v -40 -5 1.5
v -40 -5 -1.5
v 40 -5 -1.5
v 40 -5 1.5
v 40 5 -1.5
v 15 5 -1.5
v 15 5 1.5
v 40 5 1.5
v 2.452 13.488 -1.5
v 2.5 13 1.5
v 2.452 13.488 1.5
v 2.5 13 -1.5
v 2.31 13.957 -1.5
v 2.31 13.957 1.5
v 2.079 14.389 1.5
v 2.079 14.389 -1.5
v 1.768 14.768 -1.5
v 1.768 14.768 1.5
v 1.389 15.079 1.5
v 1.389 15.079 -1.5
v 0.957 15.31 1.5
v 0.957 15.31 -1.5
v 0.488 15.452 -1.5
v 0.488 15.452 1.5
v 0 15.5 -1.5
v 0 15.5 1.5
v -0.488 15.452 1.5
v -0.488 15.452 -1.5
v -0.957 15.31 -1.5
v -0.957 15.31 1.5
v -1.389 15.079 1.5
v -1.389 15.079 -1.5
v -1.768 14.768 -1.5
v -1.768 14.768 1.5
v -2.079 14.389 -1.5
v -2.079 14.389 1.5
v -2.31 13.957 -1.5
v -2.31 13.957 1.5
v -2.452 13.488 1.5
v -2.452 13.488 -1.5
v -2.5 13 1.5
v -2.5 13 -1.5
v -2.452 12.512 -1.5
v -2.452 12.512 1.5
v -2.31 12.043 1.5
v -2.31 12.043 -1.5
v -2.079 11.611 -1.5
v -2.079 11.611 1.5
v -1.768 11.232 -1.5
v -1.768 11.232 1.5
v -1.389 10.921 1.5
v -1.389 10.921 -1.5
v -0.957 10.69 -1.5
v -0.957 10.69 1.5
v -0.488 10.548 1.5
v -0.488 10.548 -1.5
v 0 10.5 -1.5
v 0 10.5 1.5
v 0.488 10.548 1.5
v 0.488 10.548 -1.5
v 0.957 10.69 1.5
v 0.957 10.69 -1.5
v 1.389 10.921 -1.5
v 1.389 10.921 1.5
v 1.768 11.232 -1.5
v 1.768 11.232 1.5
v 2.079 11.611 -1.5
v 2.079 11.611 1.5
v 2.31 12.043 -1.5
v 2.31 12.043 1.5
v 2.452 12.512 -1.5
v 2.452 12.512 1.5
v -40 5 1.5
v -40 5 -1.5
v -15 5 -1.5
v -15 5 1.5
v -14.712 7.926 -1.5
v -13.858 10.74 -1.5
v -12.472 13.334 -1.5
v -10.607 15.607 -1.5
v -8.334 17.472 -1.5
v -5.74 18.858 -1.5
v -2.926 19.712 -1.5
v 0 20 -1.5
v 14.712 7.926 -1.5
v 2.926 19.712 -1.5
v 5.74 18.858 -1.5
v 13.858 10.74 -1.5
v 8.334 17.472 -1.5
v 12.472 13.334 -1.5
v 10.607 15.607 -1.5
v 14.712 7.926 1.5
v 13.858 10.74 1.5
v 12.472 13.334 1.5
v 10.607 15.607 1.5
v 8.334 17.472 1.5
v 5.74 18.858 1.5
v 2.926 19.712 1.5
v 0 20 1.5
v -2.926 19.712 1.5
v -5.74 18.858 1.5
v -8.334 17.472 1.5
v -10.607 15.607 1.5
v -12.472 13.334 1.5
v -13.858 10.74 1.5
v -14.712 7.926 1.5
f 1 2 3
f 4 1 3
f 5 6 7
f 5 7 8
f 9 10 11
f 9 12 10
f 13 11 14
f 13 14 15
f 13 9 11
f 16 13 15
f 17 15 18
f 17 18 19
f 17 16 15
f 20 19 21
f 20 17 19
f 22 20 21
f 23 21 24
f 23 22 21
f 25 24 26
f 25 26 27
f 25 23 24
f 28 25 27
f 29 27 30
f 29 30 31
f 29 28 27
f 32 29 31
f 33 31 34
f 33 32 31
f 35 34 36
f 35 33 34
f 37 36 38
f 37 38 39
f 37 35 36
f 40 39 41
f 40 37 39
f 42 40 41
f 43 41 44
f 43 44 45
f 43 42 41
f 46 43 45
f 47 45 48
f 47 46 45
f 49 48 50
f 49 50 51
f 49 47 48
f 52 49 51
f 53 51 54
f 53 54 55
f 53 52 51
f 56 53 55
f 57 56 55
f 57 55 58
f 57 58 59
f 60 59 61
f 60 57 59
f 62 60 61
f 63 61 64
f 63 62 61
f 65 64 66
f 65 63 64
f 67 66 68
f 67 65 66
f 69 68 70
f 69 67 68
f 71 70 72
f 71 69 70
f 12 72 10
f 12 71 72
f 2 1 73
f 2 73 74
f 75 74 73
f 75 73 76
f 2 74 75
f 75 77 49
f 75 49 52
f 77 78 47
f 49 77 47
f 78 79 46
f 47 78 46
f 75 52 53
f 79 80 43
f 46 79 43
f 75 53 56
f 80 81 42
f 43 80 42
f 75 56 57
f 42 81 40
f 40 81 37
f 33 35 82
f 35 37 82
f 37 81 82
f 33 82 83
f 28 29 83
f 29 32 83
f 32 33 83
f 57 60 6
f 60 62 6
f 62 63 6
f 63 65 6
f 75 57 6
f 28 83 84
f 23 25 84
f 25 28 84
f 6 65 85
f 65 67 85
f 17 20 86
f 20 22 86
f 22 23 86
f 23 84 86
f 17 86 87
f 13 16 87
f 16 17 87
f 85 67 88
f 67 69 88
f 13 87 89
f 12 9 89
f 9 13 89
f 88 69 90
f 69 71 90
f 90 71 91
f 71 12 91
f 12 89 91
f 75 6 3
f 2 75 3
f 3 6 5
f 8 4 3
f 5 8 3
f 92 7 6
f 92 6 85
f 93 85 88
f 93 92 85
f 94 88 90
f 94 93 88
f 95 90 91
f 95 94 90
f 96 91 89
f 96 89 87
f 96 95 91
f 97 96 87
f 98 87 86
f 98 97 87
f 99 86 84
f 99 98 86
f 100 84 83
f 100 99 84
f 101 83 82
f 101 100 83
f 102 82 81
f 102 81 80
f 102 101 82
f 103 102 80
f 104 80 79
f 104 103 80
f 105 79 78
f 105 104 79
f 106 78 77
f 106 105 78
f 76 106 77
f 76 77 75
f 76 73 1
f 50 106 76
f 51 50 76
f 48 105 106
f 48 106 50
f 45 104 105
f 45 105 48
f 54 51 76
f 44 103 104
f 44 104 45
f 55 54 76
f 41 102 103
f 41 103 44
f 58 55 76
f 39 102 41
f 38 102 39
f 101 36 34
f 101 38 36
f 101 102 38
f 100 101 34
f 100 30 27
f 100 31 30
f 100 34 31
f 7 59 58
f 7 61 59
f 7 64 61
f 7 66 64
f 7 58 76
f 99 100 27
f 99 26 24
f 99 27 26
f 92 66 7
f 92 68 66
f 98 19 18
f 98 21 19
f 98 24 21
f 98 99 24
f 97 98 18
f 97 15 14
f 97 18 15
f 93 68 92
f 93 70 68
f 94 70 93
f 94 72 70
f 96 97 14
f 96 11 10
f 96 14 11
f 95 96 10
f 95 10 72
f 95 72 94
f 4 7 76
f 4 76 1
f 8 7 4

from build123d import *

# Parameters (mm, degrees)
SKETCH_1_W      = 80
SKETCH_1_H      = 3
EXTRUDE_1_DEPTH = 5
SKETCH_3_R      = 2.5
EXTRUDE_2_DEPTH = 1.5


with BuildPart() as part:
    # 草图1 → 凸台-拉伸1 (new, symmetric)
    with BuildSketch(Plane(origin=(0, 0, 0), x_dir=(1, 0, 0), z_dir=(0, 1, 0))):
        Rectangle(SKETCH_1_W, SKETCH_1_H)
    extrude(amount=EXTRUDE_1_DEPTH, both=True)

    # 草图3 → 凸台-拉伸2 (add, symmetric)
    with BuildSketch(Plane.XY):
        with BuildLine():
            Line((-15, 5), (15, 5))
            ThreePointArc((15, 5), (0, 20), (-15, 5))
        make_face()
        with Locations((0, 13)):
            Circle(SKETCH_3_R, mode=Mode.SUBTRACT)
    extrude(amount=EXTRUDE_2_DEPTH, both=True)


solid = part.part
